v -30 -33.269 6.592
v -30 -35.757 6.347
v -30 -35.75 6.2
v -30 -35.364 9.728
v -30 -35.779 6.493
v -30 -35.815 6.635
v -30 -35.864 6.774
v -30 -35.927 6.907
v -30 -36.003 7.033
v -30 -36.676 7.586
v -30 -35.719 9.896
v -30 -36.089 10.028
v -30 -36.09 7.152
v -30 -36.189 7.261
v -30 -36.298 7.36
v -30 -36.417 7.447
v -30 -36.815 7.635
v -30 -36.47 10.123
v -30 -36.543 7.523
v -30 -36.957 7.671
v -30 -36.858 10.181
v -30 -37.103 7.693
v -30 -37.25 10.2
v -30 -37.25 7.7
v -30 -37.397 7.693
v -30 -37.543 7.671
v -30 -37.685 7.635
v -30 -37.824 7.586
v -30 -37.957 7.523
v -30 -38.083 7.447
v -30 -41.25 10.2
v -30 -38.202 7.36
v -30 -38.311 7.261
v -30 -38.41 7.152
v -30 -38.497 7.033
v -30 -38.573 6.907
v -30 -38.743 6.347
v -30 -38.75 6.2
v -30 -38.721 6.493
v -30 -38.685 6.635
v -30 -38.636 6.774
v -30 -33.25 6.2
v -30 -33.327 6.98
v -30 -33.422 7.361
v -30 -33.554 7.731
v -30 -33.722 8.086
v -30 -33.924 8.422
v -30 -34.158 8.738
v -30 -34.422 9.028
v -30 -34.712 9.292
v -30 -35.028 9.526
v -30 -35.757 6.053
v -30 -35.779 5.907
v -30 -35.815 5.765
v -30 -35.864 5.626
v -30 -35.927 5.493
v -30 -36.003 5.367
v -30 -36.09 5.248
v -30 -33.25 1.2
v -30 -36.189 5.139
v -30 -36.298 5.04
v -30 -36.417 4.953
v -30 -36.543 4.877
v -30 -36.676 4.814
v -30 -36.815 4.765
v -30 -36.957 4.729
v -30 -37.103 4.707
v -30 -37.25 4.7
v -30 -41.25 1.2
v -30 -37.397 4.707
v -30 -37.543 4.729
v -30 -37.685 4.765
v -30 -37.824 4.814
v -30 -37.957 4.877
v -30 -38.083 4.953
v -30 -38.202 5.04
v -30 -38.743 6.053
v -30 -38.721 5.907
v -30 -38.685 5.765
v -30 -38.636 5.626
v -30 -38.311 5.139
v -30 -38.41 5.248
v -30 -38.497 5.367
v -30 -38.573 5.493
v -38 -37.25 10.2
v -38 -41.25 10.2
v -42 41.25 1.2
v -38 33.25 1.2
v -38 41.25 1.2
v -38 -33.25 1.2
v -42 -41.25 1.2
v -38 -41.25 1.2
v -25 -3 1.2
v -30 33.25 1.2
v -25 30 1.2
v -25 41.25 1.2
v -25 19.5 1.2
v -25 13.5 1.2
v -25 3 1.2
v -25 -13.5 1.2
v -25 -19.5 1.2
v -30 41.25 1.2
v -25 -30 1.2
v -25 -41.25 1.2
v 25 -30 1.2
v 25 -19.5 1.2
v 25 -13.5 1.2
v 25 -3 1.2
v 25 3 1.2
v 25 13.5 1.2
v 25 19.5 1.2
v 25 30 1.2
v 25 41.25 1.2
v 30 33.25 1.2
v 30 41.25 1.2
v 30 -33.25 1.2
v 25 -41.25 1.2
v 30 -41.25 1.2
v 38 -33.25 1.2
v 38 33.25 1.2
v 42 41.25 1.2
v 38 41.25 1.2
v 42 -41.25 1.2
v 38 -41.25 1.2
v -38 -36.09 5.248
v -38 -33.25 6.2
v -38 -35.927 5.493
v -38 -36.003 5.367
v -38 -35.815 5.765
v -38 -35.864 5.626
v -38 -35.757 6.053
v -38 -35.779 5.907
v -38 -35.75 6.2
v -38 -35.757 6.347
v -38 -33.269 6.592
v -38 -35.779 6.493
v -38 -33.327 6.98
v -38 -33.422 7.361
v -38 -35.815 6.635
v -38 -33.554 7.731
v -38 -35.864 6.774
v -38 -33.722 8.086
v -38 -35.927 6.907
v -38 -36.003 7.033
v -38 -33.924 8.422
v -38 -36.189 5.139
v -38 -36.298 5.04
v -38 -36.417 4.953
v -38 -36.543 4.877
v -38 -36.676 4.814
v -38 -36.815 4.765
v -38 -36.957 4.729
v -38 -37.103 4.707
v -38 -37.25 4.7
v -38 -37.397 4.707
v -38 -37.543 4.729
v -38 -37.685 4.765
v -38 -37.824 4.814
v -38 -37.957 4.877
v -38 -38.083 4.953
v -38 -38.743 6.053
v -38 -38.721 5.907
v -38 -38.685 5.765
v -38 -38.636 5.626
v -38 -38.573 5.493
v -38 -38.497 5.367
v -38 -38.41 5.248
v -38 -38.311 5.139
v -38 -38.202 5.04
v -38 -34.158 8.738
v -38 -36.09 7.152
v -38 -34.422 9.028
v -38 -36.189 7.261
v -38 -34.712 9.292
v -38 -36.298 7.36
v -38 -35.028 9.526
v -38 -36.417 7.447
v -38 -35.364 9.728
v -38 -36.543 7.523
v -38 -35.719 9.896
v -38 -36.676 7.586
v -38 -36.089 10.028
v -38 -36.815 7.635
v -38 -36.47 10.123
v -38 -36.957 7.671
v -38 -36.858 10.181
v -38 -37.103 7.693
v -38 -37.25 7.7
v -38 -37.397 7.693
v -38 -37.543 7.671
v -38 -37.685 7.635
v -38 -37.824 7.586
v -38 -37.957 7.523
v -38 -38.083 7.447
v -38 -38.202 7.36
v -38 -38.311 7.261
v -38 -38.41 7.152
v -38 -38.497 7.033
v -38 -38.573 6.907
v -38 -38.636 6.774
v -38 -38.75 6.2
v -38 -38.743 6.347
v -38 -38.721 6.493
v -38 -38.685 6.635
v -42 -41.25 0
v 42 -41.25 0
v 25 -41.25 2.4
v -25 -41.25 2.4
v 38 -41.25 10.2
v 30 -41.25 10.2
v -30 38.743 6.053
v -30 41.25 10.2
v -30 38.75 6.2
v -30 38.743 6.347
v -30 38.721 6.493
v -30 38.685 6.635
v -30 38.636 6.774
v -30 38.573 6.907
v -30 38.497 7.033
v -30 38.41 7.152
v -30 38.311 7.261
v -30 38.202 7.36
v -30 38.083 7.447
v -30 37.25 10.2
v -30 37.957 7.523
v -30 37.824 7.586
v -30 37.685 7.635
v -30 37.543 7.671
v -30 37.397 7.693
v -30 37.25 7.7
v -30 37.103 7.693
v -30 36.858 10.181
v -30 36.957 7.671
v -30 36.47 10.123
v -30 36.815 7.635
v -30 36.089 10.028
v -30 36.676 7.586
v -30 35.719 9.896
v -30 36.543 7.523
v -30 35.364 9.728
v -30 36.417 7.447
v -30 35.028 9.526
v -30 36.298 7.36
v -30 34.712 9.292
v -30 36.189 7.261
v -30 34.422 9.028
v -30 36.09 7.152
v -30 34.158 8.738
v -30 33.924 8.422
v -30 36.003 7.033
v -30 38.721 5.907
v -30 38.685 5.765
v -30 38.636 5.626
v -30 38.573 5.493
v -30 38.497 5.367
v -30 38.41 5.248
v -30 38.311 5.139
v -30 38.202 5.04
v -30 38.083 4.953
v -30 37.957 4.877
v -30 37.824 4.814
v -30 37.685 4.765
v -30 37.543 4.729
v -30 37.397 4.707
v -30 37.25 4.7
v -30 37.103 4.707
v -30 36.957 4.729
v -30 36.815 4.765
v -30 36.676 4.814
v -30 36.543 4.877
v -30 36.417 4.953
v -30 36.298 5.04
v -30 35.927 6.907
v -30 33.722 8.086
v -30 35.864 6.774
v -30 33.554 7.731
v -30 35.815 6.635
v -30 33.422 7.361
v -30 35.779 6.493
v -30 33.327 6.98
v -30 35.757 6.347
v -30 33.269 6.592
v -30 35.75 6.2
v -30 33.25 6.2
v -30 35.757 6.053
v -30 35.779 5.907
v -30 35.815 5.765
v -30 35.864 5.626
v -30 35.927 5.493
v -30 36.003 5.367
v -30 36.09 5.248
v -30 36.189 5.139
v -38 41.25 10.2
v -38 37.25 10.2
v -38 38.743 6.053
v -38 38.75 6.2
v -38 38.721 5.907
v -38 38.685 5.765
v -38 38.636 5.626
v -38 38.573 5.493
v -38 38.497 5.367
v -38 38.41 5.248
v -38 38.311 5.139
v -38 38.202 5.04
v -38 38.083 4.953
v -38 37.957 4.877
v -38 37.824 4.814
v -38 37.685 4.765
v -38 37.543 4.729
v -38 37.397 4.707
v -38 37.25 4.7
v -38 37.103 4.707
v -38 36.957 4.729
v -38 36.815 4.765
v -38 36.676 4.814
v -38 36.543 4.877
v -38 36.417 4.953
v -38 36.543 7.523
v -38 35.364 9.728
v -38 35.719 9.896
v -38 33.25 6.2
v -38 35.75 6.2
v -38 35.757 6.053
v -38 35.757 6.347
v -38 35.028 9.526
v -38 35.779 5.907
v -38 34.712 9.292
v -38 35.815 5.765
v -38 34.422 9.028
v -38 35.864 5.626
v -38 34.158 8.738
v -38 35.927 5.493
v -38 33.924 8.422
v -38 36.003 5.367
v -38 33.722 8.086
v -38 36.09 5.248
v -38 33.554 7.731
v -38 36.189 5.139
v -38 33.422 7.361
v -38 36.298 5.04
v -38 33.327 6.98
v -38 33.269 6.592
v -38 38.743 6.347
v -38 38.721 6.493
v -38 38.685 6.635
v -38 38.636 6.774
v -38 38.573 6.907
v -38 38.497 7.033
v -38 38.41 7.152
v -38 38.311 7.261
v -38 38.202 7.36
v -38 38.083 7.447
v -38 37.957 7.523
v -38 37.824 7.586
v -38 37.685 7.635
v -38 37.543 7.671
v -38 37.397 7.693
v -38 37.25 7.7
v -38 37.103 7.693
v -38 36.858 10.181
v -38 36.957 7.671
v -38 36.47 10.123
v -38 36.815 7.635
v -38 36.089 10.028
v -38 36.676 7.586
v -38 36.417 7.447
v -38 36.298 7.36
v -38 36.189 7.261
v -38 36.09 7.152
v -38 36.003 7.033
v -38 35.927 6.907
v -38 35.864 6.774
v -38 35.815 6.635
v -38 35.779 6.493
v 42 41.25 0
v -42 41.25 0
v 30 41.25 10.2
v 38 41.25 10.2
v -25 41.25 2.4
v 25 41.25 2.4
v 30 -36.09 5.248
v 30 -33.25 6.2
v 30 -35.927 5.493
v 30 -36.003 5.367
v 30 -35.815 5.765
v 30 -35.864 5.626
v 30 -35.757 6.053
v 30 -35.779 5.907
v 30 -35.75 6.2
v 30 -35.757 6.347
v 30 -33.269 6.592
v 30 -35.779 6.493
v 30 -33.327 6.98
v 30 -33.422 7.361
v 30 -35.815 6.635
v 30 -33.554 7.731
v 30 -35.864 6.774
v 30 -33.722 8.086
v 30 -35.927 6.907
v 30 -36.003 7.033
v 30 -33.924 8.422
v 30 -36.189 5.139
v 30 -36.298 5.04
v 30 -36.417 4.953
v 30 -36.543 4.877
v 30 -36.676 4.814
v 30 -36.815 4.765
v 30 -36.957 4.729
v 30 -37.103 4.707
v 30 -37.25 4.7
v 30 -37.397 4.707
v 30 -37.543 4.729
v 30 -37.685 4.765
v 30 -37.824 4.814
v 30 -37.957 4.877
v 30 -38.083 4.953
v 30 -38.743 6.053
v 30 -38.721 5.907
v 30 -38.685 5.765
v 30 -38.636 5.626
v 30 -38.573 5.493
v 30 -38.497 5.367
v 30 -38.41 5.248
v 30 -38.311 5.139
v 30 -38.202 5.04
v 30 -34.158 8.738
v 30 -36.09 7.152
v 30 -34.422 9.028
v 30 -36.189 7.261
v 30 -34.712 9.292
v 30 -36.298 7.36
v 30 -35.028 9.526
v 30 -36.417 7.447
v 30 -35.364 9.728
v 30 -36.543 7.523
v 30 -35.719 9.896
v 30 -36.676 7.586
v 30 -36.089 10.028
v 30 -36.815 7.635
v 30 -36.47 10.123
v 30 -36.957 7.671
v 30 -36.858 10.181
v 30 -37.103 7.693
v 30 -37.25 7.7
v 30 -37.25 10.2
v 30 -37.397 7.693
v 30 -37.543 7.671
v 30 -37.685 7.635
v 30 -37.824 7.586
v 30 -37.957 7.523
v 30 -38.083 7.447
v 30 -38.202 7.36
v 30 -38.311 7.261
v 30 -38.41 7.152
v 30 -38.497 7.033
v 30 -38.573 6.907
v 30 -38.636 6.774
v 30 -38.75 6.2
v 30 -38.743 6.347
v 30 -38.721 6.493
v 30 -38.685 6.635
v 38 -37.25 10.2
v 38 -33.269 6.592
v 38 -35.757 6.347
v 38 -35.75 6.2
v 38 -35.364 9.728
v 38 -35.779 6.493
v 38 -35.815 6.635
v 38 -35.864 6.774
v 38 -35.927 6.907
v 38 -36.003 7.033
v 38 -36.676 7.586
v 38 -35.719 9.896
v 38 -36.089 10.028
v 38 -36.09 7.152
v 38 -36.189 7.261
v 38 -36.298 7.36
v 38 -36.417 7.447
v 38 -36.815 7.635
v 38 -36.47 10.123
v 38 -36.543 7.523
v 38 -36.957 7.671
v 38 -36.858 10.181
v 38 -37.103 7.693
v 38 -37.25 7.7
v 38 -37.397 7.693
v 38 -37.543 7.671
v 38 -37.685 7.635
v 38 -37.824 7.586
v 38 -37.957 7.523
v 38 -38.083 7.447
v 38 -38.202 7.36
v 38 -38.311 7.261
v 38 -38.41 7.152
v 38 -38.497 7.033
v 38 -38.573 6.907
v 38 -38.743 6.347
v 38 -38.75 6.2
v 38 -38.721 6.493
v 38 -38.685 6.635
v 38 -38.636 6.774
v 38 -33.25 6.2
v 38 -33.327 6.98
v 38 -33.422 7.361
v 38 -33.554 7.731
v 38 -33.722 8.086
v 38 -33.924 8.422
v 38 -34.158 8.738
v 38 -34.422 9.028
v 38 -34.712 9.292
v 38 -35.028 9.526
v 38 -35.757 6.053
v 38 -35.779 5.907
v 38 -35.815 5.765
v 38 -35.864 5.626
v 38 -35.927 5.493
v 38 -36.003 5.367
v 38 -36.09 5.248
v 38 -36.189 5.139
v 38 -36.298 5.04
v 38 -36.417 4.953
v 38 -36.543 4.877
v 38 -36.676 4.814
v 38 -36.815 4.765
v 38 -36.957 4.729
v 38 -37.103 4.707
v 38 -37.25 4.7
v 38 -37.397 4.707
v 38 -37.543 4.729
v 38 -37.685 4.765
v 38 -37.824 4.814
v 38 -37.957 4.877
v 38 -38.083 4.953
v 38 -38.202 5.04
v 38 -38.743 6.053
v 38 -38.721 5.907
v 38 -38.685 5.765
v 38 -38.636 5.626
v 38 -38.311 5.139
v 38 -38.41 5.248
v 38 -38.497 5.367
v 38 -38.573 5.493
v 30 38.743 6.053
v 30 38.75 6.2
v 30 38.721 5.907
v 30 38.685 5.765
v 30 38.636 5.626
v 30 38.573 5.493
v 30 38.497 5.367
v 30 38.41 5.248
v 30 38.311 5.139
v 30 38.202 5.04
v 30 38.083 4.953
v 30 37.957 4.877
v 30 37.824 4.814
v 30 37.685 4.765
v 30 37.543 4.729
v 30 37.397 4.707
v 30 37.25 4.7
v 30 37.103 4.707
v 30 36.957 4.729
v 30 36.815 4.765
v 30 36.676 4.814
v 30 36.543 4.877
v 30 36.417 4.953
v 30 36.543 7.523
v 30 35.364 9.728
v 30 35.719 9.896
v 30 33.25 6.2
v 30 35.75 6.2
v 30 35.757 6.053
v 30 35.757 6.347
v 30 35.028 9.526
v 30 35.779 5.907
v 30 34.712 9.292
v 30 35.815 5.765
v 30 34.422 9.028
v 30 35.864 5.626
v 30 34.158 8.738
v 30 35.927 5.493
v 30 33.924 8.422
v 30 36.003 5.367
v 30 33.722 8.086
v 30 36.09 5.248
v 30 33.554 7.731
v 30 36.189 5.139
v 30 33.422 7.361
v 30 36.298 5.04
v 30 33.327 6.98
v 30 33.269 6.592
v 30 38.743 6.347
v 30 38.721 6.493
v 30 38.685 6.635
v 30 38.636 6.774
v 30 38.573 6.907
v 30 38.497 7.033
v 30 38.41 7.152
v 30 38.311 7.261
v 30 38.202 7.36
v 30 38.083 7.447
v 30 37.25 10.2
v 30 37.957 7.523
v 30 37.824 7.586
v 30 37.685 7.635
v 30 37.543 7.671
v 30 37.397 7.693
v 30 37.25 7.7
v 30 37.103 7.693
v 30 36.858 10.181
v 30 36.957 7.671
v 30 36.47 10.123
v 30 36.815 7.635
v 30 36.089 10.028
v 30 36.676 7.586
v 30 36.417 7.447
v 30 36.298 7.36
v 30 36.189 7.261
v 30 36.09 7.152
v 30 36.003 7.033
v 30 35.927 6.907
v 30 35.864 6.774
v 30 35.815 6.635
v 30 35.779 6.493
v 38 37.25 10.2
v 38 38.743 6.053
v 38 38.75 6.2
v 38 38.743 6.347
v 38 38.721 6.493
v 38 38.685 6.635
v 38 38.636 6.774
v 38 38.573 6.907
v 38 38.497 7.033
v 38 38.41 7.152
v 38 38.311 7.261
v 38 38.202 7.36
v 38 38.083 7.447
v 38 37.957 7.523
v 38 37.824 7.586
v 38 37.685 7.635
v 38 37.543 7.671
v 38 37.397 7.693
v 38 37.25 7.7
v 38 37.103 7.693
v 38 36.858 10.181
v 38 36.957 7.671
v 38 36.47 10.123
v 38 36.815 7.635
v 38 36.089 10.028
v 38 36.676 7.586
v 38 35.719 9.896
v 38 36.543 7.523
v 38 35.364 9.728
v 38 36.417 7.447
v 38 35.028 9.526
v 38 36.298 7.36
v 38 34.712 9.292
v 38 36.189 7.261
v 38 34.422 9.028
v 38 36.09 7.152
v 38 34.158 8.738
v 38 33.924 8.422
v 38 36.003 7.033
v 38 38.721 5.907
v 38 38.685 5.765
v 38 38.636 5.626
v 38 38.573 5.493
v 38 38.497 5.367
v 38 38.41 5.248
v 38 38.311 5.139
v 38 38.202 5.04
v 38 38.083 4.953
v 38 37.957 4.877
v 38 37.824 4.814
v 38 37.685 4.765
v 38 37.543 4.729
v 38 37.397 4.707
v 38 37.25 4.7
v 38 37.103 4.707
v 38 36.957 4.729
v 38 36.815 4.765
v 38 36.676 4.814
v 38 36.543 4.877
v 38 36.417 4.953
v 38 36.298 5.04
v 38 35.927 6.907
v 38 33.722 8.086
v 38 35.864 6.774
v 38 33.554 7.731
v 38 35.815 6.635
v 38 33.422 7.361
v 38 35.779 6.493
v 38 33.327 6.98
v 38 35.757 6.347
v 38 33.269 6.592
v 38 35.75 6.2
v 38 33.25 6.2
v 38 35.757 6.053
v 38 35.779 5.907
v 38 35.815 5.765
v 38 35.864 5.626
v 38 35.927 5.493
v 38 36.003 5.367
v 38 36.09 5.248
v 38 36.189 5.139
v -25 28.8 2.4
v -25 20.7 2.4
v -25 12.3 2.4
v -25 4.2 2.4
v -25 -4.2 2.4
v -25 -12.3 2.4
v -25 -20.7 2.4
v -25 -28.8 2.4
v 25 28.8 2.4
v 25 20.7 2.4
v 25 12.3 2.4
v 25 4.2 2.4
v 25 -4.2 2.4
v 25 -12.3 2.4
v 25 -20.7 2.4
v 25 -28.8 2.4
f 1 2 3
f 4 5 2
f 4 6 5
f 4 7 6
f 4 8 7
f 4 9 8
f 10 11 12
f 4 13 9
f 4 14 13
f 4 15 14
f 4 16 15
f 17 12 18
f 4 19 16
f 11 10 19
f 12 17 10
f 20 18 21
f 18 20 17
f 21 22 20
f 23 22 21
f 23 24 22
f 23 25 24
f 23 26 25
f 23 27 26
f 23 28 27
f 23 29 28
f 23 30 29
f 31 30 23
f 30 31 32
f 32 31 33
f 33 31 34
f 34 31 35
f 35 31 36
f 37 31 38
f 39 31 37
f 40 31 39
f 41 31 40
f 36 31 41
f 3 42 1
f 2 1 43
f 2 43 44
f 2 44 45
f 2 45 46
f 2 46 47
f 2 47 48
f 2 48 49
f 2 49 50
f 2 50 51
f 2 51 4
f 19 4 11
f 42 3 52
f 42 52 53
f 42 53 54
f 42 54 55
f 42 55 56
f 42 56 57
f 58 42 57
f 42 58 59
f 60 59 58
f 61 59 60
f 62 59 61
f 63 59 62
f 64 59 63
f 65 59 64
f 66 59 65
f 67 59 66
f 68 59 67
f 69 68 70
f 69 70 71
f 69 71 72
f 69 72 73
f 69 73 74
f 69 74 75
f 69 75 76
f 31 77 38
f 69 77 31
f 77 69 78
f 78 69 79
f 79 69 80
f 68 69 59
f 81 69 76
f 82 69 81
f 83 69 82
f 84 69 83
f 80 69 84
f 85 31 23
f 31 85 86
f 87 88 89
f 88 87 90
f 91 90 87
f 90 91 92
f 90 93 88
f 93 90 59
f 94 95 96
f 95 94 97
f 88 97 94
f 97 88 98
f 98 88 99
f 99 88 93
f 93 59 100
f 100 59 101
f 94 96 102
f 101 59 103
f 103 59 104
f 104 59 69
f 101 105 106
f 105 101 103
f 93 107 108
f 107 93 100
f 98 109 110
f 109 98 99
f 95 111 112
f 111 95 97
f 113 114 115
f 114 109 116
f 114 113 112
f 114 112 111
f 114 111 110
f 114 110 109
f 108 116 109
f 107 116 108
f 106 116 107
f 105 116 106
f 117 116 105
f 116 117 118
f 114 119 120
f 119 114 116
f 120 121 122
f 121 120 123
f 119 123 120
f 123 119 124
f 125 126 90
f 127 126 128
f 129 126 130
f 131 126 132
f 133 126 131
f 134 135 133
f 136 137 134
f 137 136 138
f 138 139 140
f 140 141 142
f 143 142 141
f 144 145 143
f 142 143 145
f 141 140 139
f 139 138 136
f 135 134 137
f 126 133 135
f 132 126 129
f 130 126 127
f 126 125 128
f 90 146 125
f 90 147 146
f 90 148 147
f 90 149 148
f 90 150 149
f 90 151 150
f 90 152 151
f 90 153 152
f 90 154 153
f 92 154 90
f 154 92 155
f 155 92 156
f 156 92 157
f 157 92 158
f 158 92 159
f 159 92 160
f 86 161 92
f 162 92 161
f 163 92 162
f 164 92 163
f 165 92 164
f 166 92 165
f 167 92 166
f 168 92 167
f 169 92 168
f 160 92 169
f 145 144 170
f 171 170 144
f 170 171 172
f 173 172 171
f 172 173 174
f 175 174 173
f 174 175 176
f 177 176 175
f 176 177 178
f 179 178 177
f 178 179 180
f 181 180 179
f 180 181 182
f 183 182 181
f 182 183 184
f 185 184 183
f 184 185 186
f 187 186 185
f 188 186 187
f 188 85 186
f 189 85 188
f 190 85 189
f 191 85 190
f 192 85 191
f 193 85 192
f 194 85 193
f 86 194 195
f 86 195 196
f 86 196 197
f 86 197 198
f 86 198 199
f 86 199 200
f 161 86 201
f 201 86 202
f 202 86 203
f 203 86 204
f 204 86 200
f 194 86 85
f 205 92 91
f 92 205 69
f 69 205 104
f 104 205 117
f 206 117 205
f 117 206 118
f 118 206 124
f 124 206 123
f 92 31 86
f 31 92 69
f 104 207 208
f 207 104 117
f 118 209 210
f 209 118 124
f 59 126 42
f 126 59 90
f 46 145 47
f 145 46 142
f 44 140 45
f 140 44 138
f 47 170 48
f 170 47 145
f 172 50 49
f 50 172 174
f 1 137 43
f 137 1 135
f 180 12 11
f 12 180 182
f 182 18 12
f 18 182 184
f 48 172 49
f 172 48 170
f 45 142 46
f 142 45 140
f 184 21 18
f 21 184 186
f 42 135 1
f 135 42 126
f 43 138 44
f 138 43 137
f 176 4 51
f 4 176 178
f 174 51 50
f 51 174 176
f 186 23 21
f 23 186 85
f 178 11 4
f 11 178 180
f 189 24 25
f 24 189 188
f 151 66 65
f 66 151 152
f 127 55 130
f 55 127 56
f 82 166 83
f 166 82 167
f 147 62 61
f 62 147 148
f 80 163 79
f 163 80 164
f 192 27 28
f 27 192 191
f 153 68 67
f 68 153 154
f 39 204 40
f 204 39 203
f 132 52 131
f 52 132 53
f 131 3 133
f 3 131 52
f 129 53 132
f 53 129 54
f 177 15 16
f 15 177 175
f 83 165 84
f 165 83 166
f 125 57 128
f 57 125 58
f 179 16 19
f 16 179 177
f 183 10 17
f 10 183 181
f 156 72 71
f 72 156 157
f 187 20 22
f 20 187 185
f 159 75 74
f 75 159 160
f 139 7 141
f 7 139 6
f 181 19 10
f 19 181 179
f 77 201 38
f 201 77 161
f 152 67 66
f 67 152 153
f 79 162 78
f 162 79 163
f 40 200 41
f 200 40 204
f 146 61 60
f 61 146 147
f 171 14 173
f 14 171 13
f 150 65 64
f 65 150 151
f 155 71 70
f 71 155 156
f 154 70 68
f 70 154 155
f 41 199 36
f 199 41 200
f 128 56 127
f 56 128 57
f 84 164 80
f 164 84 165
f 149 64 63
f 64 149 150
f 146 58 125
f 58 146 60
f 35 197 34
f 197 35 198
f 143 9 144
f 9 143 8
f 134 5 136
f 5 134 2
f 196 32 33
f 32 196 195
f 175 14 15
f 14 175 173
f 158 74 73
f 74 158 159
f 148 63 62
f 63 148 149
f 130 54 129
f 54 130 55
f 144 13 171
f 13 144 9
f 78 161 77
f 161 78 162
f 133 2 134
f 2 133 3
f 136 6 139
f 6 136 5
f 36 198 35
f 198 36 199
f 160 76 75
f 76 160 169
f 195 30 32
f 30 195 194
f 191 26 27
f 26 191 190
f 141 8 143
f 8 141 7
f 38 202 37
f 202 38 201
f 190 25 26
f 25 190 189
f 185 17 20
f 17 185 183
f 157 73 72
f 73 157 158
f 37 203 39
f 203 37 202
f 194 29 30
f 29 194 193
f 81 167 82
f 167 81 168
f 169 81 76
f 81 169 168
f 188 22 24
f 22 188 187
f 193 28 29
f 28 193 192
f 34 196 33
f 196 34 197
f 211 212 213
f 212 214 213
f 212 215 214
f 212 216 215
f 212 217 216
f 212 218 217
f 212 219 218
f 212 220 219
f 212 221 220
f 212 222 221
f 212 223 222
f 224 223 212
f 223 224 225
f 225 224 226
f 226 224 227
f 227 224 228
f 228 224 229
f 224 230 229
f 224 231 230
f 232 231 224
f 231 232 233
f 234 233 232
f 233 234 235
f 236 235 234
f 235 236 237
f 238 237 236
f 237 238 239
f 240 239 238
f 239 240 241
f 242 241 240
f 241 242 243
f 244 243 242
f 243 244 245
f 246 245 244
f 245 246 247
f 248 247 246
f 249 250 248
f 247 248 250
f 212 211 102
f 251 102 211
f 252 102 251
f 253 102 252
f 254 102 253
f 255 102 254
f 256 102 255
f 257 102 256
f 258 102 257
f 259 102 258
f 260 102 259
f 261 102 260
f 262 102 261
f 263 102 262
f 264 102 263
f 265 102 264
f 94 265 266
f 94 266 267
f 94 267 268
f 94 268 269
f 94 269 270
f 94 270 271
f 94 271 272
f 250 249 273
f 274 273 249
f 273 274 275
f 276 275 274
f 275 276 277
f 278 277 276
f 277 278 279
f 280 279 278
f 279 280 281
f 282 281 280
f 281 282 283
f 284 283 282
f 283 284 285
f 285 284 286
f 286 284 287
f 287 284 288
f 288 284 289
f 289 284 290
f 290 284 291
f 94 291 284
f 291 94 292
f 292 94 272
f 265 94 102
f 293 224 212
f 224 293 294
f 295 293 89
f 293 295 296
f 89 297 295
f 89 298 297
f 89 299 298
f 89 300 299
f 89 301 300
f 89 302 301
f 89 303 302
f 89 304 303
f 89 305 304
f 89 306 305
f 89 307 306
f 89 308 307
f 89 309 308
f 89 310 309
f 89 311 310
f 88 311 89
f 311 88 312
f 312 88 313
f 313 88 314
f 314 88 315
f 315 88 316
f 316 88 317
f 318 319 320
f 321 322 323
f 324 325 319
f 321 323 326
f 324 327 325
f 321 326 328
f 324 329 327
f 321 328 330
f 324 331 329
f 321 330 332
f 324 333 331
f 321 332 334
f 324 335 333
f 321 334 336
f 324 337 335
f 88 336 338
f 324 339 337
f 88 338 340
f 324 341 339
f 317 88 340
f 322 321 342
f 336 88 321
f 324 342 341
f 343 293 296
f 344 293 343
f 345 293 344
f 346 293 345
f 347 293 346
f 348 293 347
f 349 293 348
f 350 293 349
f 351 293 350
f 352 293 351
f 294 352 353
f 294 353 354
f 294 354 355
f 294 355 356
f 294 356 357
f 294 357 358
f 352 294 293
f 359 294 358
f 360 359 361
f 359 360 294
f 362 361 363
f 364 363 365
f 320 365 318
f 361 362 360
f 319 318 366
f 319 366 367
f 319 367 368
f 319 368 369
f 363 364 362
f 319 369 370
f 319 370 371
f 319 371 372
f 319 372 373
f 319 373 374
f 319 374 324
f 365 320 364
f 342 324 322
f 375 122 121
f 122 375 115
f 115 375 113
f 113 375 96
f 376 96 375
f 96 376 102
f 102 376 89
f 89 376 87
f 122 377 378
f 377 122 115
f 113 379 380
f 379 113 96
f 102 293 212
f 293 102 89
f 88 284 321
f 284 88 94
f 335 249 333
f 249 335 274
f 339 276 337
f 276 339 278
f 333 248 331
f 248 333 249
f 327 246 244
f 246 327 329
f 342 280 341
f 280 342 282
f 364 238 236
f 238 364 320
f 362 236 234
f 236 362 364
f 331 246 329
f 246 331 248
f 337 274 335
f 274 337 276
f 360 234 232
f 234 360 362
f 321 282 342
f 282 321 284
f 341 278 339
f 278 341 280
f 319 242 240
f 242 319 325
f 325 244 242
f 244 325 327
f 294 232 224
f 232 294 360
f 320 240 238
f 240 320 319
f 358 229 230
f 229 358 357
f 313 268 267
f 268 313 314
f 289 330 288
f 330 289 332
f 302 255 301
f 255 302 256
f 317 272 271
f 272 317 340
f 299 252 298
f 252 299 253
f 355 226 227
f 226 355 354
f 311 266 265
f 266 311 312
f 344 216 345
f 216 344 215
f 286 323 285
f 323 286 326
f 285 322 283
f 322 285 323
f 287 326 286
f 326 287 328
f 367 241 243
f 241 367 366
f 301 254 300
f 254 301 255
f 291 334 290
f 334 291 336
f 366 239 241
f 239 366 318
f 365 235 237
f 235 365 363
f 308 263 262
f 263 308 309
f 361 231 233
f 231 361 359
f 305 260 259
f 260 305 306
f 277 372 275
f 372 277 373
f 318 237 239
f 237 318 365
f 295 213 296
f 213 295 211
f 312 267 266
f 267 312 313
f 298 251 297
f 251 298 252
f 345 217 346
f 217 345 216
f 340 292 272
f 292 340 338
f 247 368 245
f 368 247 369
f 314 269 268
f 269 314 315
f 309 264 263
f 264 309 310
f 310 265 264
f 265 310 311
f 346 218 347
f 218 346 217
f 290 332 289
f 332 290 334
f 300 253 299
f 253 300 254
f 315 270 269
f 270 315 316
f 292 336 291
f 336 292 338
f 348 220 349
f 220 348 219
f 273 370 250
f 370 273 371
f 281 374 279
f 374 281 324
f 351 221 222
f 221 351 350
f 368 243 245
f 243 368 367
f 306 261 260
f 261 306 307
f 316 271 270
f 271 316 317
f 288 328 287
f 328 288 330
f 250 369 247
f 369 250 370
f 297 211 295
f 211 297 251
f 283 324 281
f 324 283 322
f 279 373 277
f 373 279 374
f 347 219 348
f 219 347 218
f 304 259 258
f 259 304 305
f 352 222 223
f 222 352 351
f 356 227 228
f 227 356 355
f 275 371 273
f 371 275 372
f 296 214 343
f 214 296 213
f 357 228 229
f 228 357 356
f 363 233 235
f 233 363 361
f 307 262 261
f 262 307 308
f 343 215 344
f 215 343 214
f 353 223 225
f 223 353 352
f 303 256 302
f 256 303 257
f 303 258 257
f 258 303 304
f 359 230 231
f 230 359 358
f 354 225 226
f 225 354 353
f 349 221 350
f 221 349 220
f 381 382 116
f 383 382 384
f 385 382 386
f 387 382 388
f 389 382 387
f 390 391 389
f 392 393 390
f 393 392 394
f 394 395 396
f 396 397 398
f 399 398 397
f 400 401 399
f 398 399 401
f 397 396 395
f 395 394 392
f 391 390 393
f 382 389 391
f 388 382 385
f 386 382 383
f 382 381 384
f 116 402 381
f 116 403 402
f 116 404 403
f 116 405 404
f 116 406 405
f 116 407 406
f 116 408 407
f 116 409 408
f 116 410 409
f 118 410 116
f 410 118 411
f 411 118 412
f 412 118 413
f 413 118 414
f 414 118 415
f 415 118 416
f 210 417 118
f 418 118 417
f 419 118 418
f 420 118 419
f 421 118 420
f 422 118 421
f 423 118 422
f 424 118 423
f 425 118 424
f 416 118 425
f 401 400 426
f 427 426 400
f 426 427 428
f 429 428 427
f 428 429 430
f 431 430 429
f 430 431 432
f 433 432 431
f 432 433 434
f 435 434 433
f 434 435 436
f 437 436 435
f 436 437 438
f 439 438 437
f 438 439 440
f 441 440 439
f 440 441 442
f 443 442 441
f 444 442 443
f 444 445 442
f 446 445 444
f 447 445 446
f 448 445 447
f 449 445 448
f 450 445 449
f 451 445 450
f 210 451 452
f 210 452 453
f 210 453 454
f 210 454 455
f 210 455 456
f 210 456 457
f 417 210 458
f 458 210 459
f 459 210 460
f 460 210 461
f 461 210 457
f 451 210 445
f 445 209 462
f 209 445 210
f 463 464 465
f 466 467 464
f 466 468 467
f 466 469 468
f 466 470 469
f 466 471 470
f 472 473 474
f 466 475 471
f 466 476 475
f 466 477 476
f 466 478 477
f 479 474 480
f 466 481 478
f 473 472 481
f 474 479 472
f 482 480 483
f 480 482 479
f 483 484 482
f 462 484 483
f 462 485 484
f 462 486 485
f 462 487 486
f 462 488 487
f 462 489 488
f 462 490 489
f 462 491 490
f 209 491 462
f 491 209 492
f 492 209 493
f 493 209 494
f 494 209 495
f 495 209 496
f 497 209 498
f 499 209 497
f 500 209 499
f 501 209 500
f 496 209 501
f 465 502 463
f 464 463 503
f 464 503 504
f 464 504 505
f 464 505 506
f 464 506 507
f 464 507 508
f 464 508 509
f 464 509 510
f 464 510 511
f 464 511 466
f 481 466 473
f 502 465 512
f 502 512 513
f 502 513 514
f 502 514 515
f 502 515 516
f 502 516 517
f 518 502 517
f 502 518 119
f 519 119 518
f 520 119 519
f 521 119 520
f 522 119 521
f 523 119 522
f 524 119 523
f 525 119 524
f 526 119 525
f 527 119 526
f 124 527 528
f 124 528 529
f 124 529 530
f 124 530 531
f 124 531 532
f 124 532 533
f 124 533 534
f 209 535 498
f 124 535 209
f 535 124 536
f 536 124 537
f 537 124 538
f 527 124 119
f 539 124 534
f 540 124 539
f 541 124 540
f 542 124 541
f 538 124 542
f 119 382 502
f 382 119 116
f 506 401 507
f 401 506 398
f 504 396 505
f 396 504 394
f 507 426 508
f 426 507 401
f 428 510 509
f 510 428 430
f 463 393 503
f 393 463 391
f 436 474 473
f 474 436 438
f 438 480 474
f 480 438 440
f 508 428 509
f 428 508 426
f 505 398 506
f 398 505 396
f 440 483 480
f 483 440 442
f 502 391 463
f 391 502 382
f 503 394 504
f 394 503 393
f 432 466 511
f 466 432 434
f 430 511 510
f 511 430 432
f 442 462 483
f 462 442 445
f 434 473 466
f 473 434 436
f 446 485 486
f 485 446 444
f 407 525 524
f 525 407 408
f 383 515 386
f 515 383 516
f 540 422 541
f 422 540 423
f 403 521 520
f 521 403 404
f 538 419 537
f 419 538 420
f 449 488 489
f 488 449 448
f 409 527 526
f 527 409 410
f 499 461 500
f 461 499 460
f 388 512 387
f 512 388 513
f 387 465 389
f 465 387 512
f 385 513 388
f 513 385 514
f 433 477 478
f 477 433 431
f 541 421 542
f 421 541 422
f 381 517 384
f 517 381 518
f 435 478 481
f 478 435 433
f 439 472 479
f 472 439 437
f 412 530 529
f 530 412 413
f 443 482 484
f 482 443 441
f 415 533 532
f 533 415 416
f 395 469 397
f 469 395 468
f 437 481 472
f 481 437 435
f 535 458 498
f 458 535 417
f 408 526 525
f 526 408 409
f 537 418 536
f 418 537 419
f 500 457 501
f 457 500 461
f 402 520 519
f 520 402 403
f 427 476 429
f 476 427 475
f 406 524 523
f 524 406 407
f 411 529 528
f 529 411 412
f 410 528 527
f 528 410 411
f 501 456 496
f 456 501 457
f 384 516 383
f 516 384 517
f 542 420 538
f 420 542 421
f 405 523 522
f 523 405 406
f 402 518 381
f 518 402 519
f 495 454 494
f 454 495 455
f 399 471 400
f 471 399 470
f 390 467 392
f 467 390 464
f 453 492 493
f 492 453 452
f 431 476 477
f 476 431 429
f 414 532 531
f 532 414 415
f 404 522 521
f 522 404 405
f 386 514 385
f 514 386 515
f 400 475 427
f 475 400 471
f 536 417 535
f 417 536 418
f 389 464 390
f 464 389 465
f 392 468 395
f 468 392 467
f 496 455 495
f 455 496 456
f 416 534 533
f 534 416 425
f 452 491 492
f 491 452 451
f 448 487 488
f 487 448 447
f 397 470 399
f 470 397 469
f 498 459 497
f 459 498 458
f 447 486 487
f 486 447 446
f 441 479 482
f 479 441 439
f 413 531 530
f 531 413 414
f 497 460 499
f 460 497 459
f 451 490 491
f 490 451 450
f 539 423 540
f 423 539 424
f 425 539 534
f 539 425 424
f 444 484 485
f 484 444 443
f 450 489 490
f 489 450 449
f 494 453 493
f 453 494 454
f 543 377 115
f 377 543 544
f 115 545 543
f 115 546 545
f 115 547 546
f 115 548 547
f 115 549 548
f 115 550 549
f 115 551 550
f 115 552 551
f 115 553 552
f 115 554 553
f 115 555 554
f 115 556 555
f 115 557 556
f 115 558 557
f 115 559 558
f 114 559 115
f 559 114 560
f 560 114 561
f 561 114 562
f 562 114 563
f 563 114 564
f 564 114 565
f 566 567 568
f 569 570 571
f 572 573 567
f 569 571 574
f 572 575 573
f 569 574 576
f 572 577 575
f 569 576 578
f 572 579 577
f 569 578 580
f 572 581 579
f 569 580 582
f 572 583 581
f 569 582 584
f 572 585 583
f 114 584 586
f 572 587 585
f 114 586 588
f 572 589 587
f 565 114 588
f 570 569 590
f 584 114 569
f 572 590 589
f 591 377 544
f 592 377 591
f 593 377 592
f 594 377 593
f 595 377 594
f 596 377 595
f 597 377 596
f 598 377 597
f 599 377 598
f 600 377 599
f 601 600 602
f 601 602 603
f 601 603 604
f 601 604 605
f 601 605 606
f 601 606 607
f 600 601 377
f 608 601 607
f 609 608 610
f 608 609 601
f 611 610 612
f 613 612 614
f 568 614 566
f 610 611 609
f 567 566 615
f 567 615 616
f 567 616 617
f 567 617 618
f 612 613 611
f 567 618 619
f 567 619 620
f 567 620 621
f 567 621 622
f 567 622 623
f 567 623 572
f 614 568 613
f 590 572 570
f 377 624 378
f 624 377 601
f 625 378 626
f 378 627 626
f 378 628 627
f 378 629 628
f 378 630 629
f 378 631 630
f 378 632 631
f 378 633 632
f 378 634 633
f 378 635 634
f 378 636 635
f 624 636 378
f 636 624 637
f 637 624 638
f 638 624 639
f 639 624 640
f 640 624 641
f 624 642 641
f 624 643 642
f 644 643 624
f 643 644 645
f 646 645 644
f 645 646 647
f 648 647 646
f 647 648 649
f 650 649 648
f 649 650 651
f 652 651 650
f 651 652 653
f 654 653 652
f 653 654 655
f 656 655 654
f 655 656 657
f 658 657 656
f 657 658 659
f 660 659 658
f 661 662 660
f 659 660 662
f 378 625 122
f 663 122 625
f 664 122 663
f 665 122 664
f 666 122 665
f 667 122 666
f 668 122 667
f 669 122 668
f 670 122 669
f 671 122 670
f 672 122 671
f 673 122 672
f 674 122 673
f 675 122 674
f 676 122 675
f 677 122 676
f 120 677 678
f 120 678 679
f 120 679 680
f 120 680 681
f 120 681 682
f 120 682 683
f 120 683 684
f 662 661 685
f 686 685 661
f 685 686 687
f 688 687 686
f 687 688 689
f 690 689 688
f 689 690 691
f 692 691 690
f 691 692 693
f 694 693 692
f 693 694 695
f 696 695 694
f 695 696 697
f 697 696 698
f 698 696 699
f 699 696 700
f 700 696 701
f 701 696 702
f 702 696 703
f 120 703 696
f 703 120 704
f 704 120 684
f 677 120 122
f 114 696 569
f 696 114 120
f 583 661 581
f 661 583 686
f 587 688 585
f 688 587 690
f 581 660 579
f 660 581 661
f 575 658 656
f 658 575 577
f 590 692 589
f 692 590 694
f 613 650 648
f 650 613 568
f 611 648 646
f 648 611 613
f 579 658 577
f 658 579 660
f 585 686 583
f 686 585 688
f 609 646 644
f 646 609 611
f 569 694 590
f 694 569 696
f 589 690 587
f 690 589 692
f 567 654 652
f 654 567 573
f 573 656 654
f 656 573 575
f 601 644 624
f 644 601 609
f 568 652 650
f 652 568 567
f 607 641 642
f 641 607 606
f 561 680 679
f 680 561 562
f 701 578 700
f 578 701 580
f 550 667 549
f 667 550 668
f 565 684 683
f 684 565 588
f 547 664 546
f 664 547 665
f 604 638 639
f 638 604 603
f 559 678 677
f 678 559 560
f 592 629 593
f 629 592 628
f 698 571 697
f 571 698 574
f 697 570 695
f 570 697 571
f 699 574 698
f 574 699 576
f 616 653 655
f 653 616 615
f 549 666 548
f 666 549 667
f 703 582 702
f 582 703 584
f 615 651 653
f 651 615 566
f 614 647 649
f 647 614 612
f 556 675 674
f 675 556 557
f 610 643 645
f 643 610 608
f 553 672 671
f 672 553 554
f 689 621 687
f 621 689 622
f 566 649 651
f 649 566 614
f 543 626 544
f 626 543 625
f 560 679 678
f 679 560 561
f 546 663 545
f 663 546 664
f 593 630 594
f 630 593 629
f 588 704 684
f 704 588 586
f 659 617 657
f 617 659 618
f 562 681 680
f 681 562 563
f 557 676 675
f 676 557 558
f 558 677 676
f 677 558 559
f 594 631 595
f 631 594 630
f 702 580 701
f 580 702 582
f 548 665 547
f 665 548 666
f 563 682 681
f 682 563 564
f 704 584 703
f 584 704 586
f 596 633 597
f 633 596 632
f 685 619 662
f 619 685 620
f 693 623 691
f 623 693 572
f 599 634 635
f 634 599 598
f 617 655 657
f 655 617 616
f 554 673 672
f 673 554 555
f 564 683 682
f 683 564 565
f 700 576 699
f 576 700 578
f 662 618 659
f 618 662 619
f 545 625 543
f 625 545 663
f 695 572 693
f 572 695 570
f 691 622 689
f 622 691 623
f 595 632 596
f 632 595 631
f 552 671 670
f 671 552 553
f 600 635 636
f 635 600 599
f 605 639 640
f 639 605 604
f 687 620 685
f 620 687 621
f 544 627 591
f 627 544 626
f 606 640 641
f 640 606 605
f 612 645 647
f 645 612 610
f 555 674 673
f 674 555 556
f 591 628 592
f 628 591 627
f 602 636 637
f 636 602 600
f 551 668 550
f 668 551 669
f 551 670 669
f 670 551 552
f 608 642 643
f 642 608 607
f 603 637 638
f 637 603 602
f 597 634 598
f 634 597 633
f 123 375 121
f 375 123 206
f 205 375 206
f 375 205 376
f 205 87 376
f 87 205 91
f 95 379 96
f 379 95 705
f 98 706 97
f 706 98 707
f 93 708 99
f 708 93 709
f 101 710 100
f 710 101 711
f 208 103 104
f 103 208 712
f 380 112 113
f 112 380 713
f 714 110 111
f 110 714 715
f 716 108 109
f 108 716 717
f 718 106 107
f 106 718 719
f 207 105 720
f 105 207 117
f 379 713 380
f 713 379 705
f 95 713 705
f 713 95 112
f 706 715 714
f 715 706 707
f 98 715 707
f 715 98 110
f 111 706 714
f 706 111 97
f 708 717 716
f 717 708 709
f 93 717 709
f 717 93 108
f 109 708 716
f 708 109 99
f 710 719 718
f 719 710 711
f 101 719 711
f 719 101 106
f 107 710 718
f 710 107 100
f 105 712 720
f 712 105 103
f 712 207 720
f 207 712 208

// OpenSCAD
$fn=64;
bsl=1/100;

part="bottom";//[NOSTL_assembly,bottom,foot]
wall=1.2;
angle=10;
thickness=8;
hole=3;
slack=1;

led_width=10.5;
led_length=50;
led_depth=1.2;
led_dist=16.5;
led_strips=4;

box_size=[led_length+4*thickness+2*slack,led_dist*(1+led_strips)];
length=box_size[1]-thickness;

module bottom() {
  translate(-box_size/2) cube([box_size[0],box_size[1],wall]);
  translate([0,-box_size[1]/2,wall]) rotate([90,0,90])linear_extrude(height=led_length,center=true) 
  difference() {
    square([box_size[1],led_depth]);
    for (shift=[led_dist:led_dist:box_size[1]-1]) translate([shift,0]) polygon([[-led_width/2,0],[led_width/2,0],[0,led_width/2]]);
  }
  for (xflip=[[0,0],[1,0]],yflip=[[0,0],[0,1]]) mirror(xflip) mirror(yflip) translate(-box_size/2) eyelet();
}

module eyelet() {
  difference() {
    union() {
      translate([thickness/2,0,wall])cube([thickness,thickness/2,thickness+slack]);
      translate([thickness/2,0,wall])cube([thickness,thickness,thickness/2+slack]);
      translate([thickness/2,thickness/2,wall+thickness/2+slack])rotate([0,90,0])cylinder(d=thickness,h=thickness);

    }
    translate([thickness/2-bsl,thickness/2,wall+thickness/2+slack])rotate([0,90,0])cylinder(d=hole,h=thickness+2*bsl);
  }
}

module foot() {
  difference() {
    hull() {
      cylinder(d=thickness,h=thickness);
      translate([length-thickness,0,0]) cylinder(d=thickness,h=thickness);
    }
  translate([0,0,-bsl])cylinder(d=hole,h=thickness+2*bsl);
  rotate([0,0,angle])translate([-thickness/2-bsl,-length/2,thickness/2]) cube([thickness+2*bsl,length,thickness]);
  translate([-thickness/2-bsl,-length/2,thickness/2]) cube([thickness+2*bsl,length,thickness]);
  }
}
if (part=="foot") foot();
if (part=="bottom") bottom();
if (part=="NOSTL_assembly") {
  bottom();
  translate([2*thickness,thickness/2,wall+thickness/2])
  translate(-box_size/2) rotate([angle,0,0])rotate([0,-90,0])foot();

}
